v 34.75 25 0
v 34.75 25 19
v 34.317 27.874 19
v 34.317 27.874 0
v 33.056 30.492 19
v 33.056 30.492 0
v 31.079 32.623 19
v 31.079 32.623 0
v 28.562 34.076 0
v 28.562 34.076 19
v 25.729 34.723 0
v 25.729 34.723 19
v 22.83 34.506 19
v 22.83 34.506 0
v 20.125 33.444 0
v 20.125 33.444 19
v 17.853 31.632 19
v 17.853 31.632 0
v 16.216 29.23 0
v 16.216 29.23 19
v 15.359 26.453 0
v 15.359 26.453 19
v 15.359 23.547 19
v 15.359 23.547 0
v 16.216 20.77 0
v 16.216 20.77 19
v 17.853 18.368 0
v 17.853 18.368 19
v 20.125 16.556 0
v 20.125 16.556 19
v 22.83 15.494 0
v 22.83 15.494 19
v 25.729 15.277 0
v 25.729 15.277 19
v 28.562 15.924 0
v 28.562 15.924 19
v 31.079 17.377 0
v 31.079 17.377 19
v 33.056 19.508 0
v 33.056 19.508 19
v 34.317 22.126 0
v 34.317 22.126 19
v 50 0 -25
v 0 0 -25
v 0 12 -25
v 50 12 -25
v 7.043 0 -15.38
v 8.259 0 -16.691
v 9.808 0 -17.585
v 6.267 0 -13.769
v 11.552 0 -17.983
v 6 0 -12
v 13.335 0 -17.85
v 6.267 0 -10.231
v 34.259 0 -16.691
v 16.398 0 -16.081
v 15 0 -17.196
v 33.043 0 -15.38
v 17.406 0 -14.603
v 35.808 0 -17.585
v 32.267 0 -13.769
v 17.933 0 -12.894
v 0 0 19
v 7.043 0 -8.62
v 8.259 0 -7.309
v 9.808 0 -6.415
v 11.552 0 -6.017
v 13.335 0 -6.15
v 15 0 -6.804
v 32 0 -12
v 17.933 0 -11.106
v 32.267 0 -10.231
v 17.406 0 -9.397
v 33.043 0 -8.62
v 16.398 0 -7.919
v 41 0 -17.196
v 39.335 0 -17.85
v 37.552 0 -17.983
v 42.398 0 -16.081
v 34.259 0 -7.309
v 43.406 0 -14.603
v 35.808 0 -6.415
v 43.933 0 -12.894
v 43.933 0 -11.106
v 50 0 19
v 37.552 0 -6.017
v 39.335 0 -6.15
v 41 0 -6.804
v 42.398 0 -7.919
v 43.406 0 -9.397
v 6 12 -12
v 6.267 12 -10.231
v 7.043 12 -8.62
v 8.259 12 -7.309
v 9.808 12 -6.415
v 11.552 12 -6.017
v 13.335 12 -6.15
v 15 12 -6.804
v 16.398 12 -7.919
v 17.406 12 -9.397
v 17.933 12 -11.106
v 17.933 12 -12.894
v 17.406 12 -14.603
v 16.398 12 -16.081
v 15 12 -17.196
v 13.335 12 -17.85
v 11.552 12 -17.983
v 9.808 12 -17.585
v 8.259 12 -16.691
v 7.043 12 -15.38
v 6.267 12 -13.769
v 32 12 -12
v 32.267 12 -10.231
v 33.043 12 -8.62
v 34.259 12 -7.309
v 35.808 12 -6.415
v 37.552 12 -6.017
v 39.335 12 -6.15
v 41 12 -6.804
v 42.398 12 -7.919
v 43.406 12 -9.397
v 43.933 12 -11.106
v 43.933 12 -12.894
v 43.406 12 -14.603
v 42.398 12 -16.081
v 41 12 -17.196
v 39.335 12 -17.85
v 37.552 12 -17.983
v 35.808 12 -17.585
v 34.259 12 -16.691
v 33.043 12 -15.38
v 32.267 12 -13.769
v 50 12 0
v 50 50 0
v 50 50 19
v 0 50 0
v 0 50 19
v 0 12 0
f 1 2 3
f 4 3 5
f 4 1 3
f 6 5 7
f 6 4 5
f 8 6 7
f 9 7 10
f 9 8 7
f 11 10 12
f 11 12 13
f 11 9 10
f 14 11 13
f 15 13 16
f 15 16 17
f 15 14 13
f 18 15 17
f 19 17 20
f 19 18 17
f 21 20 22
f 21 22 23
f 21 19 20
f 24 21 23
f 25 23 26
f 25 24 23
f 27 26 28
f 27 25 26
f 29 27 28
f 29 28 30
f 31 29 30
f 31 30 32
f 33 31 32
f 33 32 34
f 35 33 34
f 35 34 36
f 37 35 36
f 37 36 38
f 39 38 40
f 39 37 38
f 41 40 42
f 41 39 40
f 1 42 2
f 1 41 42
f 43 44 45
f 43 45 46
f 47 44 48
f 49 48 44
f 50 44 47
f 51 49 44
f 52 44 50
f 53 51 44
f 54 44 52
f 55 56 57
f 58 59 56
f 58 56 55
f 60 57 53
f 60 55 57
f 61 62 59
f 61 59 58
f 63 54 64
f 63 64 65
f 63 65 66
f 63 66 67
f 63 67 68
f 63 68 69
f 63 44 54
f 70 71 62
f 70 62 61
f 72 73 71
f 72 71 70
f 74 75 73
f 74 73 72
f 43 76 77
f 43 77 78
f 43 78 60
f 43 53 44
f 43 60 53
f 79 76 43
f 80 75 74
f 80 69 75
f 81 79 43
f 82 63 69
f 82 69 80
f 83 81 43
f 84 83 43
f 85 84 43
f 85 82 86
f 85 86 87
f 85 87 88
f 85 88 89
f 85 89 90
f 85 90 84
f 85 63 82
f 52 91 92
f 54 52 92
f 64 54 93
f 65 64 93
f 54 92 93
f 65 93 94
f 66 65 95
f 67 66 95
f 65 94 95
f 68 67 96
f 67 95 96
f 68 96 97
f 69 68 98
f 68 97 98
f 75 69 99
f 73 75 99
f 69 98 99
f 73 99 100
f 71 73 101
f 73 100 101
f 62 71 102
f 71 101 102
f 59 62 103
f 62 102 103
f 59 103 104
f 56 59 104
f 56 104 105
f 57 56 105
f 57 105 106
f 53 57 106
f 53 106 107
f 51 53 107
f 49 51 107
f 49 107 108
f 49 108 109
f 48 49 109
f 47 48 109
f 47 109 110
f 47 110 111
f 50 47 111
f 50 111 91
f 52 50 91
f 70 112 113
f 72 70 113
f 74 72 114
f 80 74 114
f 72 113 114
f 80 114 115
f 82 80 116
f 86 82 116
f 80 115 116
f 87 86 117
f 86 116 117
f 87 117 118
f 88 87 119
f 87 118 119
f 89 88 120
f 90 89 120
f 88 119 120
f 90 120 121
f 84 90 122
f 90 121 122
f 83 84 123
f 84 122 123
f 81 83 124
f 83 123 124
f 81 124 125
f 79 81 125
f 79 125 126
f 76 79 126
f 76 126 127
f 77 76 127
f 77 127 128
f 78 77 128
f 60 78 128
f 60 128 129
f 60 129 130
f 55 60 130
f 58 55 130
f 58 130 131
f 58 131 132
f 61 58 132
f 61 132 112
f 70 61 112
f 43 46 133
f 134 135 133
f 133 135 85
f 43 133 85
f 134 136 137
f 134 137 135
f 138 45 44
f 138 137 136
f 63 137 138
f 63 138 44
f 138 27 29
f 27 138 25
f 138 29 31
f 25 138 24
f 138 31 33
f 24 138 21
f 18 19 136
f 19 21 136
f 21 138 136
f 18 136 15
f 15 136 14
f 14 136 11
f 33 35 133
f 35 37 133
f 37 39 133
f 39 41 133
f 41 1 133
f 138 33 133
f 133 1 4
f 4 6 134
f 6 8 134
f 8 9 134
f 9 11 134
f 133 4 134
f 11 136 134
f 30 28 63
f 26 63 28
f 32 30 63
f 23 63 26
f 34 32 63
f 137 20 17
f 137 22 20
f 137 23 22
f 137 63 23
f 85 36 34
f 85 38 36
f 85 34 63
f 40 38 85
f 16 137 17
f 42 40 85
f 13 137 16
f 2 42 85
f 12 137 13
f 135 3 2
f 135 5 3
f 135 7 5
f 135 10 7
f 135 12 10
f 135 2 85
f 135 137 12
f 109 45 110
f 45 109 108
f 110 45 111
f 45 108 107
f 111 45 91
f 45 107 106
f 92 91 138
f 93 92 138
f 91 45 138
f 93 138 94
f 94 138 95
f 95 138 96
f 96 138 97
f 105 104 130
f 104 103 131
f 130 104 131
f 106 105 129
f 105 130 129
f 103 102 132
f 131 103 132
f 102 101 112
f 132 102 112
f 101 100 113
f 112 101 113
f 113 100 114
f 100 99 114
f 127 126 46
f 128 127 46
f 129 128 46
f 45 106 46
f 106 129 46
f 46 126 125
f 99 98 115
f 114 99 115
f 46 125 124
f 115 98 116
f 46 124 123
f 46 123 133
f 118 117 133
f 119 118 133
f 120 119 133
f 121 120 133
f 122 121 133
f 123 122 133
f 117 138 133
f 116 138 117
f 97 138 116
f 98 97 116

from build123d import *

# Parameters (mm, degrees)
F0_W     = 50
F0_H     = 50
F0_R     = 9.75
F1_DEPTH = 19
F2_W     = 50
F2_H     = 12
F3_DEPTH = 25
F4_R     = 6
F5_DEPTH = 12.001


with BuildPart() as f1:
    # F0 (on Top) → F1 (new body)
    with BuildSketch(Plane.XY):
        with Locations((25, 25)):
            Rectangle(F0_W, F0_H)
        with Locations((25, 25)):
            Circle(F0_R, mode=Mode.SUBTRACT)
    extrude(amount=F1_DEPTH)

    # F2 (on face) → F3 (join)
    with BuildSketch(Plane(origin=(0, 0, 0), x_dir=(1, 0, 0), z_dir=(0, 0, -1))):
        with Locations((25, -6)):
            Rectangle(F2_W, F2_H)
    extrude(amount=F3_DEPTH)

    # F4 (on face) → F5 (cut, through all)
    with BuildSketch(Plane(origin=(0, 12, 0), x_dir=(-1, 0, 0), z_dir=(0, 1, 0))):
        with Locations((-38, -12)):
            Circle(F4_R)
        with Locations((-12, -12)):
            Circle(F4_R)
    extrude(amount=-F5_DEPTH, mode=Mode.SUBTRACT)


solid = f1.part
